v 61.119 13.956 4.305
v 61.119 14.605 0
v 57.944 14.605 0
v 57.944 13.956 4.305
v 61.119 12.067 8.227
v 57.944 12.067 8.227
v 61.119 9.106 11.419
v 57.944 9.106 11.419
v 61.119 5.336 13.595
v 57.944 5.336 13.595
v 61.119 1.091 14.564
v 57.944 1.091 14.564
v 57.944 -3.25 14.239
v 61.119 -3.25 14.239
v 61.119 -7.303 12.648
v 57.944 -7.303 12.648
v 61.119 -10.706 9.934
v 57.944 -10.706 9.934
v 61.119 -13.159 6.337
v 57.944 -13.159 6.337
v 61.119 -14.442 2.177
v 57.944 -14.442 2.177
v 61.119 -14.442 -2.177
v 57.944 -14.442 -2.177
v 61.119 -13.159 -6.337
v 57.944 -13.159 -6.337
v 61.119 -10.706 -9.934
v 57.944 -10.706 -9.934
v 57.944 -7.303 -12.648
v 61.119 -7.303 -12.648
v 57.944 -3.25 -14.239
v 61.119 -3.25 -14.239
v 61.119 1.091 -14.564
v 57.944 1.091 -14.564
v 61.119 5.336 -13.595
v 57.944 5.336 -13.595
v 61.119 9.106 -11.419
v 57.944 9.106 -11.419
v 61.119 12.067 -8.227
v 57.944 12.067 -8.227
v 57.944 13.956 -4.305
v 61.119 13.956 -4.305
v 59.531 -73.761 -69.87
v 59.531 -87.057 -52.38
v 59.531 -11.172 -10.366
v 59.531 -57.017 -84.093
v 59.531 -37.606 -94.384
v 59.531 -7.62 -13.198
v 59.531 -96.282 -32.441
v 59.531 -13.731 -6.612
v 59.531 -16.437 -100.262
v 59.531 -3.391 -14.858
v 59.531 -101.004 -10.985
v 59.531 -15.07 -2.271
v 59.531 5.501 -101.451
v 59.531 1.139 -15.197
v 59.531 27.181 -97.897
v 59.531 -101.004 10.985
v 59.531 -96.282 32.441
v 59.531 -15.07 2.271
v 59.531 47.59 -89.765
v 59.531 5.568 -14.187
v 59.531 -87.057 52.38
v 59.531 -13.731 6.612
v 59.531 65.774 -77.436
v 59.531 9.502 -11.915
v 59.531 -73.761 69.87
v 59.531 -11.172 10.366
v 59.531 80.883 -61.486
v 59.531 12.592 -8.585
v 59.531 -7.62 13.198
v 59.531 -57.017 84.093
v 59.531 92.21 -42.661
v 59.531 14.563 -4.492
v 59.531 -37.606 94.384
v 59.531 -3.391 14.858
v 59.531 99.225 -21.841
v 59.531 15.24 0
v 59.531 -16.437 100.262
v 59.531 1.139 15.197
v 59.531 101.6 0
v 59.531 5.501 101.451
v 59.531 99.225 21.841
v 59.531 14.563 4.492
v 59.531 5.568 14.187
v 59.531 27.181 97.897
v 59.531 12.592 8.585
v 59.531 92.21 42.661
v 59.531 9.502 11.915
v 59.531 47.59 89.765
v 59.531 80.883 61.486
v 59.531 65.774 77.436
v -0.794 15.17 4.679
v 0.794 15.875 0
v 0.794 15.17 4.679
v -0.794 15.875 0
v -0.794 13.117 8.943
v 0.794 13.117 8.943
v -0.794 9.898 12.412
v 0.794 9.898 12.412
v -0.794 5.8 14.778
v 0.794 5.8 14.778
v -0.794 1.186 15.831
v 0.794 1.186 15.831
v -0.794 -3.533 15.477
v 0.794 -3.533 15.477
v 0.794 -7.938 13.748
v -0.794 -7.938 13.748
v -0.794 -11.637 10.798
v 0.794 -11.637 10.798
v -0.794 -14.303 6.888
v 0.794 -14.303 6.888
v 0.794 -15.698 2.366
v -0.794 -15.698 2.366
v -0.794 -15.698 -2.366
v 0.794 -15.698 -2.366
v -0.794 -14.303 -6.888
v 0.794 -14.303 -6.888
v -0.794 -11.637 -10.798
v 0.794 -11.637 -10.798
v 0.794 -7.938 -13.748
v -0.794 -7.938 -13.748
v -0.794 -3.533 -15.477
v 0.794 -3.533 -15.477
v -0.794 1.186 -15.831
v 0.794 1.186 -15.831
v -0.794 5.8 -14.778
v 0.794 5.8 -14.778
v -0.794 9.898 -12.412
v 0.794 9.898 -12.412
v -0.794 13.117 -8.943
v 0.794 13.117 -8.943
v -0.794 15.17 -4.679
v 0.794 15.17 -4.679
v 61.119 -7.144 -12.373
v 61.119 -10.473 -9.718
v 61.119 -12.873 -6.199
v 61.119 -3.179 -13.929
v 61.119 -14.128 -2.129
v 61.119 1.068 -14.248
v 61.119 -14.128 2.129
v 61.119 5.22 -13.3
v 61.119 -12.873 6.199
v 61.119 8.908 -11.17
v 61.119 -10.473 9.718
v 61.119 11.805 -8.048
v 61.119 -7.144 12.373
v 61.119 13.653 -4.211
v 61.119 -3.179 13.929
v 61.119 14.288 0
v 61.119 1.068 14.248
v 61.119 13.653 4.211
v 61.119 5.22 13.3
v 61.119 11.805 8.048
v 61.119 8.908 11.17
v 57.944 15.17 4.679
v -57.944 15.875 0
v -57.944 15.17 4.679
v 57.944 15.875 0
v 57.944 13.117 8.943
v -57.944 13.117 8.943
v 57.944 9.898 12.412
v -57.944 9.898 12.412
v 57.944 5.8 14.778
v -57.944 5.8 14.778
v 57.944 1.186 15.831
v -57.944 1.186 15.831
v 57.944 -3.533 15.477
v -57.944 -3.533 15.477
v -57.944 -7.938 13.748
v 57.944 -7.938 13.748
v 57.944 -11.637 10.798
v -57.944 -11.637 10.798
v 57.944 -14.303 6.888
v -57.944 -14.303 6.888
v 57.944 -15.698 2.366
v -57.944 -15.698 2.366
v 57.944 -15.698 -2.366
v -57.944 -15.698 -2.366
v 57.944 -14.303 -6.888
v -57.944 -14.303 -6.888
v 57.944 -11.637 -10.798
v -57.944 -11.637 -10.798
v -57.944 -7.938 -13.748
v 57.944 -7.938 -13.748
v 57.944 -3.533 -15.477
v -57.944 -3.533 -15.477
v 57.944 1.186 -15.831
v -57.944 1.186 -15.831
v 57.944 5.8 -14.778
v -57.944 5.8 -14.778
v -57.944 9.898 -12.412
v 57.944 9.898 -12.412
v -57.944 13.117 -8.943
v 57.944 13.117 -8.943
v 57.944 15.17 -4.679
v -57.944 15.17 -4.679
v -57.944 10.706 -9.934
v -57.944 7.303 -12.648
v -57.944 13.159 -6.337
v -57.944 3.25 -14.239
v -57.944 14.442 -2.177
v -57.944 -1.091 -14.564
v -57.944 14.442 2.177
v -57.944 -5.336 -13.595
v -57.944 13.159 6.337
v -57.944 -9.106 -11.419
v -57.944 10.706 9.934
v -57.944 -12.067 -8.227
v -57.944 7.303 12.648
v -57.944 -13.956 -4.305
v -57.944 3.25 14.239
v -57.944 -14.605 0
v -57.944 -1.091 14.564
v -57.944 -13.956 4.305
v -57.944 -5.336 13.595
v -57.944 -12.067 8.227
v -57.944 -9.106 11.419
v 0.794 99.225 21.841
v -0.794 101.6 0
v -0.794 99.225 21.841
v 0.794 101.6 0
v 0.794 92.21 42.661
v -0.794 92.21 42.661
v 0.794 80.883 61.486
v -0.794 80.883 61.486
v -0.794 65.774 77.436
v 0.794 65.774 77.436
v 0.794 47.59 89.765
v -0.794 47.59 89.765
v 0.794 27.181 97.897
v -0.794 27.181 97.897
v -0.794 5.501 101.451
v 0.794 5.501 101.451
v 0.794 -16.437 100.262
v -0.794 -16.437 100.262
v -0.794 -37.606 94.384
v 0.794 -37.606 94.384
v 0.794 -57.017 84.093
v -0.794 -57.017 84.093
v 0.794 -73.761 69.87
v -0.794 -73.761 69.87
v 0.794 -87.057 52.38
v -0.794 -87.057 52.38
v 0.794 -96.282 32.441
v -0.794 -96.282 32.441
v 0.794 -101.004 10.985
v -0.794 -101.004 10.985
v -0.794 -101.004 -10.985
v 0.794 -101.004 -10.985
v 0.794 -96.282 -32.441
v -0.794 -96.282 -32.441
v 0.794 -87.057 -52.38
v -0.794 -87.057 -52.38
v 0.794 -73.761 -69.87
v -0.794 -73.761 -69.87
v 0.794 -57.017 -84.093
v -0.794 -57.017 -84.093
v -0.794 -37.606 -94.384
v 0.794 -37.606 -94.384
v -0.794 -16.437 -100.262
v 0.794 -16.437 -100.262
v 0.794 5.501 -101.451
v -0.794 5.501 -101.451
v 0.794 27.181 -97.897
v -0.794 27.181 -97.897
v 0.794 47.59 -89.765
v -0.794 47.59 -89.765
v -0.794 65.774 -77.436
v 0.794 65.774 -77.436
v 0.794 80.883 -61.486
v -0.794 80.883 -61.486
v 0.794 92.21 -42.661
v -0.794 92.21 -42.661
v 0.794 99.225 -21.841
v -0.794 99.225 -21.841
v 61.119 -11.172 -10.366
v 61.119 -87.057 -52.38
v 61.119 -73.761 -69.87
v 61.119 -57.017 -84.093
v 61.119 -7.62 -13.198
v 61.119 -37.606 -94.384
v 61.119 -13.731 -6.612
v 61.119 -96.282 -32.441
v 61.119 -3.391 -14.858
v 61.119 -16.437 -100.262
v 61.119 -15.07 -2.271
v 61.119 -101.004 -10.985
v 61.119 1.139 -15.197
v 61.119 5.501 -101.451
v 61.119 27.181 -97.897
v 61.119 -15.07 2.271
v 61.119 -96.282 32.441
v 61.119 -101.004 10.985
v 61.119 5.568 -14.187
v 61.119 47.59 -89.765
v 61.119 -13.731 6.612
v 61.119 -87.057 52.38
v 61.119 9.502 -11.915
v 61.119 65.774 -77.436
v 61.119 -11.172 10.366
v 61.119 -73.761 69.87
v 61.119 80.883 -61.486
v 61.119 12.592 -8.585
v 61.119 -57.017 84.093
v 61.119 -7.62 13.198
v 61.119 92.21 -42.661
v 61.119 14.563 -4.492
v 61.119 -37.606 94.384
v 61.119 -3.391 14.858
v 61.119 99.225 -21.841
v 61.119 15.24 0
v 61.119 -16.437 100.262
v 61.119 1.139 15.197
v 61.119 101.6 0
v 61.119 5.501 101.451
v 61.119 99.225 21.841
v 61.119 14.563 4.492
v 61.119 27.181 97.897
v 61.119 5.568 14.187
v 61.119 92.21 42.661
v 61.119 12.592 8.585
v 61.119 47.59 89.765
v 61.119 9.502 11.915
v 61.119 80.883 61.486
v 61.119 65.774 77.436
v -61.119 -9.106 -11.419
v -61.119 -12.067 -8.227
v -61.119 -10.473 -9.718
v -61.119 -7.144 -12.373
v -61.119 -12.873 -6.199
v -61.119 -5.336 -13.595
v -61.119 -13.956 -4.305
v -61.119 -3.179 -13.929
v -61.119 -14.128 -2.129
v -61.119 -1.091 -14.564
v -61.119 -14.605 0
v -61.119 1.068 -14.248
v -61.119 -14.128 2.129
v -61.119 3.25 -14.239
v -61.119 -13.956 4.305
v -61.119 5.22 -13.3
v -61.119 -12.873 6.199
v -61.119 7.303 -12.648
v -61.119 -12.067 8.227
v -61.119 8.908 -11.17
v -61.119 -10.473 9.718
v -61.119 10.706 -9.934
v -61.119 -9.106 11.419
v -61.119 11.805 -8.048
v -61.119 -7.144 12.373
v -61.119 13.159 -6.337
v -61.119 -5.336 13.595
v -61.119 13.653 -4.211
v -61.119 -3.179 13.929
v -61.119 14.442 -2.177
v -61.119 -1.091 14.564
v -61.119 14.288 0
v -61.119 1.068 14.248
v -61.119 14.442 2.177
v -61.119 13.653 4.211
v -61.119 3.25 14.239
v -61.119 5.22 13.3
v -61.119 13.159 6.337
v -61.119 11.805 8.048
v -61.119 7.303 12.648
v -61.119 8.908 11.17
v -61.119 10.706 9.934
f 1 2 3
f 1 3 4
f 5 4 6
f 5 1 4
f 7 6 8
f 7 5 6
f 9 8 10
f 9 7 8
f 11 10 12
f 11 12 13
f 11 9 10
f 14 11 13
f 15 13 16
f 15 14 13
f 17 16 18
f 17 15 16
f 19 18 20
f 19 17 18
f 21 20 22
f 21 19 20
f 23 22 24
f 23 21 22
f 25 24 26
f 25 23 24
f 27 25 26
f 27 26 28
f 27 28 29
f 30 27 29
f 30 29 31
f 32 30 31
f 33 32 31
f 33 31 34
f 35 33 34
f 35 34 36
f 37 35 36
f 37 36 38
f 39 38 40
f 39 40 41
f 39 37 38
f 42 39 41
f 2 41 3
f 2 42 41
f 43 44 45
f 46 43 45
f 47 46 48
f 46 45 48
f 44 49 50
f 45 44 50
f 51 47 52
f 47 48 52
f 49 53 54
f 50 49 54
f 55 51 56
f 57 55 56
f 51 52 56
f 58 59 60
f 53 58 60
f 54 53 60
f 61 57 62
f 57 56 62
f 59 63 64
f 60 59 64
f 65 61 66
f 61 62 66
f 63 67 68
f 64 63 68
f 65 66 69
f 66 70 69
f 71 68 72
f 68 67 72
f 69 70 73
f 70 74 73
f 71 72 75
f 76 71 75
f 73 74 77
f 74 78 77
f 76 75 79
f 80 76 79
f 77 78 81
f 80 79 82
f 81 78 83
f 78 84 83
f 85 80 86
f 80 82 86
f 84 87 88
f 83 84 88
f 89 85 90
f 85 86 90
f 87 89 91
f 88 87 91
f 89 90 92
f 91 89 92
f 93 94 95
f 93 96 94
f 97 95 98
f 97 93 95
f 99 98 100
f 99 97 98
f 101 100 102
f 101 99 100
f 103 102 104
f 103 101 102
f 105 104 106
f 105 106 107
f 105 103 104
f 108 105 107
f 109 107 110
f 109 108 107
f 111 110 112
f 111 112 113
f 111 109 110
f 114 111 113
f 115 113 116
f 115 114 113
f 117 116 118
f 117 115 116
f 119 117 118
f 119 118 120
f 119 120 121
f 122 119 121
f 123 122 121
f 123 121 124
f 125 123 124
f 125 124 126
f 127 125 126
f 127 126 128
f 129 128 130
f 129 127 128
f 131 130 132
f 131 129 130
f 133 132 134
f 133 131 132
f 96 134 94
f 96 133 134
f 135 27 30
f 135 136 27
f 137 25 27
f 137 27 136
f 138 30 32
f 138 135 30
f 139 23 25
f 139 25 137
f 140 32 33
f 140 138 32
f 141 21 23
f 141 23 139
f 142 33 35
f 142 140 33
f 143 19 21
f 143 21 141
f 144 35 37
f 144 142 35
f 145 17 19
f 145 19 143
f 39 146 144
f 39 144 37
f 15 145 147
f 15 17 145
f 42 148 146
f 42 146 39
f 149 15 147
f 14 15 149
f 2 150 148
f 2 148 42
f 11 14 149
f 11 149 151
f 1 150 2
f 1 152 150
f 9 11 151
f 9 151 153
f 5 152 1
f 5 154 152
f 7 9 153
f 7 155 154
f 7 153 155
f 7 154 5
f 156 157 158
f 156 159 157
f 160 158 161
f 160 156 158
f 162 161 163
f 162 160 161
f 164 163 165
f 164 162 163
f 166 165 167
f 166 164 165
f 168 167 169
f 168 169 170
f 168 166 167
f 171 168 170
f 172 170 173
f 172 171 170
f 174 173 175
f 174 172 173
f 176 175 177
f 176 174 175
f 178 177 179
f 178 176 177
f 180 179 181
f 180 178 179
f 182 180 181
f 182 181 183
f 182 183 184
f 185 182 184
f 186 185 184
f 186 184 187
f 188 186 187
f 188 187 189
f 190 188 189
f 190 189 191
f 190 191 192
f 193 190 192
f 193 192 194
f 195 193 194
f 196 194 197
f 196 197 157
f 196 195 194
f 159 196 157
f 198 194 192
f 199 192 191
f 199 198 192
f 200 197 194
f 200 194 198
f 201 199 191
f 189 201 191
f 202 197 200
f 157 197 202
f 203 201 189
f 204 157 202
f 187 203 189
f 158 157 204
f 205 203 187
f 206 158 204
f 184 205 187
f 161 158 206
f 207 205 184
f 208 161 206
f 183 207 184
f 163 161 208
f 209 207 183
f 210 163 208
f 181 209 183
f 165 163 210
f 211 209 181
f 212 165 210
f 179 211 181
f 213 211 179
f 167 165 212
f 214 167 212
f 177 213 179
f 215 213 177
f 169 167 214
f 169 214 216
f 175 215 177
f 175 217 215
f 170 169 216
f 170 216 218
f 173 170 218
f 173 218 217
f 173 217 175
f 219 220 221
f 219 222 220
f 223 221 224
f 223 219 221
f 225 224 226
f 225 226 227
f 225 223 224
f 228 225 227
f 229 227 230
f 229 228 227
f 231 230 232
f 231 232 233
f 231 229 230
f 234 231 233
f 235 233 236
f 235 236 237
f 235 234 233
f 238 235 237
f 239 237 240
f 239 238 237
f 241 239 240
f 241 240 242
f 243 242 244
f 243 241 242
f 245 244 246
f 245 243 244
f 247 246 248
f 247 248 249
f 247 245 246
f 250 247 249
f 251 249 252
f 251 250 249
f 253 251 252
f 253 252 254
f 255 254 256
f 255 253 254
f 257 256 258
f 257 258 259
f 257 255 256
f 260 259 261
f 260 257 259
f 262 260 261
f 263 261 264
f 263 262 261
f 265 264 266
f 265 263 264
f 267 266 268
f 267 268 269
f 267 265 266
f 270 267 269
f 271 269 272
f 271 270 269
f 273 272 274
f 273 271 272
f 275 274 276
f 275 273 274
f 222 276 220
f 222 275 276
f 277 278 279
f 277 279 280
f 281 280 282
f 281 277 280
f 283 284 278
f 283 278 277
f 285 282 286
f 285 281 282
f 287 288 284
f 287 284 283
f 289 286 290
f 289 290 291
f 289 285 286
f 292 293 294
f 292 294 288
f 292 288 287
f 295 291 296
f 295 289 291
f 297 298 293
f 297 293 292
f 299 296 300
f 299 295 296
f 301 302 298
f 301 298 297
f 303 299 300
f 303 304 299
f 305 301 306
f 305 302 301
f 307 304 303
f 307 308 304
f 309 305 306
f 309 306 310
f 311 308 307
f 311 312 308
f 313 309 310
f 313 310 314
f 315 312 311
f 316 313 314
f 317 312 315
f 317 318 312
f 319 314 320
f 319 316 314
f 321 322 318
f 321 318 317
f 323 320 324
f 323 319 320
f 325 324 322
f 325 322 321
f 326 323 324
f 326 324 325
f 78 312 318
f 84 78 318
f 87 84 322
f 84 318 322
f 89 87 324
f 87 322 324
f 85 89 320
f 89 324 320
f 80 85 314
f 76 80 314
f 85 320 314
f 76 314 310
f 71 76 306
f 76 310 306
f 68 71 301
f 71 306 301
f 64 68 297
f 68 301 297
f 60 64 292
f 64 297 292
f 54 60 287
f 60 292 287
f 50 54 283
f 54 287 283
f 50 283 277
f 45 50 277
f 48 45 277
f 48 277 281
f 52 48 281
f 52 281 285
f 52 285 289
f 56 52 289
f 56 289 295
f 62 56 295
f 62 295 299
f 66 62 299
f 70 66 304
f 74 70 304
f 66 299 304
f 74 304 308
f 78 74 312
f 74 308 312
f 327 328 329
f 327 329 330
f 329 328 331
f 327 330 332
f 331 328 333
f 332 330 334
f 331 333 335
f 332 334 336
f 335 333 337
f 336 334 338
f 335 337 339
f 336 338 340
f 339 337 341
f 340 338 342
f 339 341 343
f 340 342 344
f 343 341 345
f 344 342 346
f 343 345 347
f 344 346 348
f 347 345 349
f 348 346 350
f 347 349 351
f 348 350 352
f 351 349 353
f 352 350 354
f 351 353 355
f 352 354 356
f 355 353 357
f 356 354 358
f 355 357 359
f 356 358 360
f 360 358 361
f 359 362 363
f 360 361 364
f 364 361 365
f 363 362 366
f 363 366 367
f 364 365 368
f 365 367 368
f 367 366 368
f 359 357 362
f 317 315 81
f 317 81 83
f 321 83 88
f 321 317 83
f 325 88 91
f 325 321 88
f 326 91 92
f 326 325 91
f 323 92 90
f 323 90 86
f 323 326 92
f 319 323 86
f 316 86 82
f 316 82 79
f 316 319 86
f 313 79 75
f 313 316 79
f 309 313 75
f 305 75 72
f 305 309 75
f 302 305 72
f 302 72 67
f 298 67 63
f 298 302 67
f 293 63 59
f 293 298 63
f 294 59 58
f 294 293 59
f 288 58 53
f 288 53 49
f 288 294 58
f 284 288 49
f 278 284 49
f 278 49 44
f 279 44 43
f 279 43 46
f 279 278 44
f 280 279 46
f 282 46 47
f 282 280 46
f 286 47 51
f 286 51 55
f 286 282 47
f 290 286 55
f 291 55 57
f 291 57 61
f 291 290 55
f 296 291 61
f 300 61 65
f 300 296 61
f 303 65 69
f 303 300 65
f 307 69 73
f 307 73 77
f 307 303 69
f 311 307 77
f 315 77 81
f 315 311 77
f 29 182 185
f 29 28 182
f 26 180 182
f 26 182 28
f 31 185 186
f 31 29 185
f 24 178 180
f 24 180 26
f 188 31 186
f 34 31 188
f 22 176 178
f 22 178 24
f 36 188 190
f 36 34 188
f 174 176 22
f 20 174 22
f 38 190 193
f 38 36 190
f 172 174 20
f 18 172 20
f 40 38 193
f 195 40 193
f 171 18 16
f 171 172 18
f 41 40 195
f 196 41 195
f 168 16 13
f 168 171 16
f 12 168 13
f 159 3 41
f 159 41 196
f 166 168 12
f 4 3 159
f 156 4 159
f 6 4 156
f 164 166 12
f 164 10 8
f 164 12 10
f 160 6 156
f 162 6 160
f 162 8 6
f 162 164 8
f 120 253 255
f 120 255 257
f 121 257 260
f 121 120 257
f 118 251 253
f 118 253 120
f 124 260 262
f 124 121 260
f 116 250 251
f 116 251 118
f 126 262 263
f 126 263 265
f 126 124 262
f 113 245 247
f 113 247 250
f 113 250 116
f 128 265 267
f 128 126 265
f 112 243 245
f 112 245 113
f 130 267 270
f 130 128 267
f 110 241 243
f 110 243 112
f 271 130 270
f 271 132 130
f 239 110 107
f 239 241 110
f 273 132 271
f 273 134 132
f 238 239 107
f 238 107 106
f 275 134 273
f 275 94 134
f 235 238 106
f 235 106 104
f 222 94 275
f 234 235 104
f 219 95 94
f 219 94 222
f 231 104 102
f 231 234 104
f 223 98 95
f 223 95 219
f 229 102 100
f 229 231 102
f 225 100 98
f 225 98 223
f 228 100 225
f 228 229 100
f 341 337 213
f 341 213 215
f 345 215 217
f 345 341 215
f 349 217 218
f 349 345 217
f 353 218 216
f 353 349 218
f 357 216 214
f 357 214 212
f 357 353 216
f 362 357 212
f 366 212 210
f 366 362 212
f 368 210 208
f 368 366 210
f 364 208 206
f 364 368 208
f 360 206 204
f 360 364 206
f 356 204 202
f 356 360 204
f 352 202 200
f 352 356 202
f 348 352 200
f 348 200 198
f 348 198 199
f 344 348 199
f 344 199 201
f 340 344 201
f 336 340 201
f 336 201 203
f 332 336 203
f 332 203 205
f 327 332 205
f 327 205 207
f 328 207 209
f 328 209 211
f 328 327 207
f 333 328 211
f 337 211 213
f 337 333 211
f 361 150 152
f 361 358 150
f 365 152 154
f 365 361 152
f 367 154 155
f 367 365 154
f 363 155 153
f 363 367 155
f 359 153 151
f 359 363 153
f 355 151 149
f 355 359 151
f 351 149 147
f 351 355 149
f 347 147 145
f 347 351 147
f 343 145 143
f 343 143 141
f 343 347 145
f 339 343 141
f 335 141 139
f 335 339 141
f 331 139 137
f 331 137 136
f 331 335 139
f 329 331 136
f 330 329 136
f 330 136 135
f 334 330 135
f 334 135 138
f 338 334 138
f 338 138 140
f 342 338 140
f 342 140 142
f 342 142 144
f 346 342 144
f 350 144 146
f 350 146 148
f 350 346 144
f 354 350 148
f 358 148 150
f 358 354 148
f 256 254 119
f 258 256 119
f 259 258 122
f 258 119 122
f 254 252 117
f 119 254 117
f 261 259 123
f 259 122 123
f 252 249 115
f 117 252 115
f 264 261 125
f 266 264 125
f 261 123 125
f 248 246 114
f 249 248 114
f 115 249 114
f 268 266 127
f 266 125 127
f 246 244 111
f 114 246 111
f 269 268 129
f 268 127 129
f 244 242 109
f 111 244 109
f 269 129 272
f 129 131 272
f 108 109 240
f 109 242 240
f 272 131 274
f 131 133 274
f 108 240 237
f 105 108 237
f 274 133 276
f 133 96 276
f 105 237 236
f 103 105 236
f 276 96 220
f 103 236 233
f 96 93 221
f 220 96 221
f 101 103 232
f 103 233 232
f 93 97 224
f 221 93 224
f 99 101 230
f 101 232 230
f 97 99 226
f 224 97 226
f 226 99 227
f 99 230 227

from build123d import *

# Parameters (mm, degrees)
F0_R     = 15.875
F0_R_2   = 14.605
F0_R_3   = 14.2875
F1_DEPTH = 61.11875
F2_R     = 15.875
F2_R_2   = 14.605
F3_DEPTH = 3.175
F4_R     = 15.875
F4_R_2   = 14.605
F5_DEPTH = 3.175
F6_R     = 101.6
F6_R_2   = 15.24
F7_DEPTH = 1.5875
F8_R     = 101.6
F8_R_2   = 15.875
F9_DEPTH = 0.79375


with BuildPart() as f1:
    # F0 (on Right) → F1 (new body, symmetric)
    with BuildSketch(Plane.YZ):
        Circle(F0_R)
        Circle(F0_R_2, mode=Mode.SUBTRACT)
        Circle(F0_R_2)
        Circle(F0_R_3, mode=Mode.SUBTRACT)
    extrude(amount=F1_DEPTH, both=True)

    # F2 (on face) → F3 (cut)
    with BuildSketch(Plane.YZ.offset(61.11875)):
        Circle(F2_R)
        Circle(F2_R_2, mode=Mode.SUBTRACT)
    extrude(amount=-F3_DEPTH, mode=Mode.SUBTRACT)

    # F4 (on face) → F5 (cut)
    with BuildSketch(Plane(origin=(-61.11875, 0, 0), x_dir=(0, -1, 0), z_dir=(-1, 0, 0))):
        Circle(F4_R)
        Circle(F4_R_2, mode=Mode.SUBTRACT)
    extrude(amount=-F5_DEPTH, mode=Mode.SUBTRACT)


with BuildPart() as f7:
    # F6 (on face) → F7 (new body)
    with BuildSketch(Plane.YZ.offset(61.11875)):
        Circle(F6_R)
        Circle(F6_R_2, mode=Mode.SUBTRACT)
    extrude(amount=-F7_DEPTH)


with BuildPart() as f9:
    # F8 (on Right) → F9 (new body, symmetric)
    with BuildSketch(Plane.YZ):
        Circle(F8_R)
        Circle(F8_R_2, mode=Mode.SUBTRACT)
    extrude(amount=F9_DEPTH, both=True)


solid = Compound([f1.part, f7.part, f9.part])
